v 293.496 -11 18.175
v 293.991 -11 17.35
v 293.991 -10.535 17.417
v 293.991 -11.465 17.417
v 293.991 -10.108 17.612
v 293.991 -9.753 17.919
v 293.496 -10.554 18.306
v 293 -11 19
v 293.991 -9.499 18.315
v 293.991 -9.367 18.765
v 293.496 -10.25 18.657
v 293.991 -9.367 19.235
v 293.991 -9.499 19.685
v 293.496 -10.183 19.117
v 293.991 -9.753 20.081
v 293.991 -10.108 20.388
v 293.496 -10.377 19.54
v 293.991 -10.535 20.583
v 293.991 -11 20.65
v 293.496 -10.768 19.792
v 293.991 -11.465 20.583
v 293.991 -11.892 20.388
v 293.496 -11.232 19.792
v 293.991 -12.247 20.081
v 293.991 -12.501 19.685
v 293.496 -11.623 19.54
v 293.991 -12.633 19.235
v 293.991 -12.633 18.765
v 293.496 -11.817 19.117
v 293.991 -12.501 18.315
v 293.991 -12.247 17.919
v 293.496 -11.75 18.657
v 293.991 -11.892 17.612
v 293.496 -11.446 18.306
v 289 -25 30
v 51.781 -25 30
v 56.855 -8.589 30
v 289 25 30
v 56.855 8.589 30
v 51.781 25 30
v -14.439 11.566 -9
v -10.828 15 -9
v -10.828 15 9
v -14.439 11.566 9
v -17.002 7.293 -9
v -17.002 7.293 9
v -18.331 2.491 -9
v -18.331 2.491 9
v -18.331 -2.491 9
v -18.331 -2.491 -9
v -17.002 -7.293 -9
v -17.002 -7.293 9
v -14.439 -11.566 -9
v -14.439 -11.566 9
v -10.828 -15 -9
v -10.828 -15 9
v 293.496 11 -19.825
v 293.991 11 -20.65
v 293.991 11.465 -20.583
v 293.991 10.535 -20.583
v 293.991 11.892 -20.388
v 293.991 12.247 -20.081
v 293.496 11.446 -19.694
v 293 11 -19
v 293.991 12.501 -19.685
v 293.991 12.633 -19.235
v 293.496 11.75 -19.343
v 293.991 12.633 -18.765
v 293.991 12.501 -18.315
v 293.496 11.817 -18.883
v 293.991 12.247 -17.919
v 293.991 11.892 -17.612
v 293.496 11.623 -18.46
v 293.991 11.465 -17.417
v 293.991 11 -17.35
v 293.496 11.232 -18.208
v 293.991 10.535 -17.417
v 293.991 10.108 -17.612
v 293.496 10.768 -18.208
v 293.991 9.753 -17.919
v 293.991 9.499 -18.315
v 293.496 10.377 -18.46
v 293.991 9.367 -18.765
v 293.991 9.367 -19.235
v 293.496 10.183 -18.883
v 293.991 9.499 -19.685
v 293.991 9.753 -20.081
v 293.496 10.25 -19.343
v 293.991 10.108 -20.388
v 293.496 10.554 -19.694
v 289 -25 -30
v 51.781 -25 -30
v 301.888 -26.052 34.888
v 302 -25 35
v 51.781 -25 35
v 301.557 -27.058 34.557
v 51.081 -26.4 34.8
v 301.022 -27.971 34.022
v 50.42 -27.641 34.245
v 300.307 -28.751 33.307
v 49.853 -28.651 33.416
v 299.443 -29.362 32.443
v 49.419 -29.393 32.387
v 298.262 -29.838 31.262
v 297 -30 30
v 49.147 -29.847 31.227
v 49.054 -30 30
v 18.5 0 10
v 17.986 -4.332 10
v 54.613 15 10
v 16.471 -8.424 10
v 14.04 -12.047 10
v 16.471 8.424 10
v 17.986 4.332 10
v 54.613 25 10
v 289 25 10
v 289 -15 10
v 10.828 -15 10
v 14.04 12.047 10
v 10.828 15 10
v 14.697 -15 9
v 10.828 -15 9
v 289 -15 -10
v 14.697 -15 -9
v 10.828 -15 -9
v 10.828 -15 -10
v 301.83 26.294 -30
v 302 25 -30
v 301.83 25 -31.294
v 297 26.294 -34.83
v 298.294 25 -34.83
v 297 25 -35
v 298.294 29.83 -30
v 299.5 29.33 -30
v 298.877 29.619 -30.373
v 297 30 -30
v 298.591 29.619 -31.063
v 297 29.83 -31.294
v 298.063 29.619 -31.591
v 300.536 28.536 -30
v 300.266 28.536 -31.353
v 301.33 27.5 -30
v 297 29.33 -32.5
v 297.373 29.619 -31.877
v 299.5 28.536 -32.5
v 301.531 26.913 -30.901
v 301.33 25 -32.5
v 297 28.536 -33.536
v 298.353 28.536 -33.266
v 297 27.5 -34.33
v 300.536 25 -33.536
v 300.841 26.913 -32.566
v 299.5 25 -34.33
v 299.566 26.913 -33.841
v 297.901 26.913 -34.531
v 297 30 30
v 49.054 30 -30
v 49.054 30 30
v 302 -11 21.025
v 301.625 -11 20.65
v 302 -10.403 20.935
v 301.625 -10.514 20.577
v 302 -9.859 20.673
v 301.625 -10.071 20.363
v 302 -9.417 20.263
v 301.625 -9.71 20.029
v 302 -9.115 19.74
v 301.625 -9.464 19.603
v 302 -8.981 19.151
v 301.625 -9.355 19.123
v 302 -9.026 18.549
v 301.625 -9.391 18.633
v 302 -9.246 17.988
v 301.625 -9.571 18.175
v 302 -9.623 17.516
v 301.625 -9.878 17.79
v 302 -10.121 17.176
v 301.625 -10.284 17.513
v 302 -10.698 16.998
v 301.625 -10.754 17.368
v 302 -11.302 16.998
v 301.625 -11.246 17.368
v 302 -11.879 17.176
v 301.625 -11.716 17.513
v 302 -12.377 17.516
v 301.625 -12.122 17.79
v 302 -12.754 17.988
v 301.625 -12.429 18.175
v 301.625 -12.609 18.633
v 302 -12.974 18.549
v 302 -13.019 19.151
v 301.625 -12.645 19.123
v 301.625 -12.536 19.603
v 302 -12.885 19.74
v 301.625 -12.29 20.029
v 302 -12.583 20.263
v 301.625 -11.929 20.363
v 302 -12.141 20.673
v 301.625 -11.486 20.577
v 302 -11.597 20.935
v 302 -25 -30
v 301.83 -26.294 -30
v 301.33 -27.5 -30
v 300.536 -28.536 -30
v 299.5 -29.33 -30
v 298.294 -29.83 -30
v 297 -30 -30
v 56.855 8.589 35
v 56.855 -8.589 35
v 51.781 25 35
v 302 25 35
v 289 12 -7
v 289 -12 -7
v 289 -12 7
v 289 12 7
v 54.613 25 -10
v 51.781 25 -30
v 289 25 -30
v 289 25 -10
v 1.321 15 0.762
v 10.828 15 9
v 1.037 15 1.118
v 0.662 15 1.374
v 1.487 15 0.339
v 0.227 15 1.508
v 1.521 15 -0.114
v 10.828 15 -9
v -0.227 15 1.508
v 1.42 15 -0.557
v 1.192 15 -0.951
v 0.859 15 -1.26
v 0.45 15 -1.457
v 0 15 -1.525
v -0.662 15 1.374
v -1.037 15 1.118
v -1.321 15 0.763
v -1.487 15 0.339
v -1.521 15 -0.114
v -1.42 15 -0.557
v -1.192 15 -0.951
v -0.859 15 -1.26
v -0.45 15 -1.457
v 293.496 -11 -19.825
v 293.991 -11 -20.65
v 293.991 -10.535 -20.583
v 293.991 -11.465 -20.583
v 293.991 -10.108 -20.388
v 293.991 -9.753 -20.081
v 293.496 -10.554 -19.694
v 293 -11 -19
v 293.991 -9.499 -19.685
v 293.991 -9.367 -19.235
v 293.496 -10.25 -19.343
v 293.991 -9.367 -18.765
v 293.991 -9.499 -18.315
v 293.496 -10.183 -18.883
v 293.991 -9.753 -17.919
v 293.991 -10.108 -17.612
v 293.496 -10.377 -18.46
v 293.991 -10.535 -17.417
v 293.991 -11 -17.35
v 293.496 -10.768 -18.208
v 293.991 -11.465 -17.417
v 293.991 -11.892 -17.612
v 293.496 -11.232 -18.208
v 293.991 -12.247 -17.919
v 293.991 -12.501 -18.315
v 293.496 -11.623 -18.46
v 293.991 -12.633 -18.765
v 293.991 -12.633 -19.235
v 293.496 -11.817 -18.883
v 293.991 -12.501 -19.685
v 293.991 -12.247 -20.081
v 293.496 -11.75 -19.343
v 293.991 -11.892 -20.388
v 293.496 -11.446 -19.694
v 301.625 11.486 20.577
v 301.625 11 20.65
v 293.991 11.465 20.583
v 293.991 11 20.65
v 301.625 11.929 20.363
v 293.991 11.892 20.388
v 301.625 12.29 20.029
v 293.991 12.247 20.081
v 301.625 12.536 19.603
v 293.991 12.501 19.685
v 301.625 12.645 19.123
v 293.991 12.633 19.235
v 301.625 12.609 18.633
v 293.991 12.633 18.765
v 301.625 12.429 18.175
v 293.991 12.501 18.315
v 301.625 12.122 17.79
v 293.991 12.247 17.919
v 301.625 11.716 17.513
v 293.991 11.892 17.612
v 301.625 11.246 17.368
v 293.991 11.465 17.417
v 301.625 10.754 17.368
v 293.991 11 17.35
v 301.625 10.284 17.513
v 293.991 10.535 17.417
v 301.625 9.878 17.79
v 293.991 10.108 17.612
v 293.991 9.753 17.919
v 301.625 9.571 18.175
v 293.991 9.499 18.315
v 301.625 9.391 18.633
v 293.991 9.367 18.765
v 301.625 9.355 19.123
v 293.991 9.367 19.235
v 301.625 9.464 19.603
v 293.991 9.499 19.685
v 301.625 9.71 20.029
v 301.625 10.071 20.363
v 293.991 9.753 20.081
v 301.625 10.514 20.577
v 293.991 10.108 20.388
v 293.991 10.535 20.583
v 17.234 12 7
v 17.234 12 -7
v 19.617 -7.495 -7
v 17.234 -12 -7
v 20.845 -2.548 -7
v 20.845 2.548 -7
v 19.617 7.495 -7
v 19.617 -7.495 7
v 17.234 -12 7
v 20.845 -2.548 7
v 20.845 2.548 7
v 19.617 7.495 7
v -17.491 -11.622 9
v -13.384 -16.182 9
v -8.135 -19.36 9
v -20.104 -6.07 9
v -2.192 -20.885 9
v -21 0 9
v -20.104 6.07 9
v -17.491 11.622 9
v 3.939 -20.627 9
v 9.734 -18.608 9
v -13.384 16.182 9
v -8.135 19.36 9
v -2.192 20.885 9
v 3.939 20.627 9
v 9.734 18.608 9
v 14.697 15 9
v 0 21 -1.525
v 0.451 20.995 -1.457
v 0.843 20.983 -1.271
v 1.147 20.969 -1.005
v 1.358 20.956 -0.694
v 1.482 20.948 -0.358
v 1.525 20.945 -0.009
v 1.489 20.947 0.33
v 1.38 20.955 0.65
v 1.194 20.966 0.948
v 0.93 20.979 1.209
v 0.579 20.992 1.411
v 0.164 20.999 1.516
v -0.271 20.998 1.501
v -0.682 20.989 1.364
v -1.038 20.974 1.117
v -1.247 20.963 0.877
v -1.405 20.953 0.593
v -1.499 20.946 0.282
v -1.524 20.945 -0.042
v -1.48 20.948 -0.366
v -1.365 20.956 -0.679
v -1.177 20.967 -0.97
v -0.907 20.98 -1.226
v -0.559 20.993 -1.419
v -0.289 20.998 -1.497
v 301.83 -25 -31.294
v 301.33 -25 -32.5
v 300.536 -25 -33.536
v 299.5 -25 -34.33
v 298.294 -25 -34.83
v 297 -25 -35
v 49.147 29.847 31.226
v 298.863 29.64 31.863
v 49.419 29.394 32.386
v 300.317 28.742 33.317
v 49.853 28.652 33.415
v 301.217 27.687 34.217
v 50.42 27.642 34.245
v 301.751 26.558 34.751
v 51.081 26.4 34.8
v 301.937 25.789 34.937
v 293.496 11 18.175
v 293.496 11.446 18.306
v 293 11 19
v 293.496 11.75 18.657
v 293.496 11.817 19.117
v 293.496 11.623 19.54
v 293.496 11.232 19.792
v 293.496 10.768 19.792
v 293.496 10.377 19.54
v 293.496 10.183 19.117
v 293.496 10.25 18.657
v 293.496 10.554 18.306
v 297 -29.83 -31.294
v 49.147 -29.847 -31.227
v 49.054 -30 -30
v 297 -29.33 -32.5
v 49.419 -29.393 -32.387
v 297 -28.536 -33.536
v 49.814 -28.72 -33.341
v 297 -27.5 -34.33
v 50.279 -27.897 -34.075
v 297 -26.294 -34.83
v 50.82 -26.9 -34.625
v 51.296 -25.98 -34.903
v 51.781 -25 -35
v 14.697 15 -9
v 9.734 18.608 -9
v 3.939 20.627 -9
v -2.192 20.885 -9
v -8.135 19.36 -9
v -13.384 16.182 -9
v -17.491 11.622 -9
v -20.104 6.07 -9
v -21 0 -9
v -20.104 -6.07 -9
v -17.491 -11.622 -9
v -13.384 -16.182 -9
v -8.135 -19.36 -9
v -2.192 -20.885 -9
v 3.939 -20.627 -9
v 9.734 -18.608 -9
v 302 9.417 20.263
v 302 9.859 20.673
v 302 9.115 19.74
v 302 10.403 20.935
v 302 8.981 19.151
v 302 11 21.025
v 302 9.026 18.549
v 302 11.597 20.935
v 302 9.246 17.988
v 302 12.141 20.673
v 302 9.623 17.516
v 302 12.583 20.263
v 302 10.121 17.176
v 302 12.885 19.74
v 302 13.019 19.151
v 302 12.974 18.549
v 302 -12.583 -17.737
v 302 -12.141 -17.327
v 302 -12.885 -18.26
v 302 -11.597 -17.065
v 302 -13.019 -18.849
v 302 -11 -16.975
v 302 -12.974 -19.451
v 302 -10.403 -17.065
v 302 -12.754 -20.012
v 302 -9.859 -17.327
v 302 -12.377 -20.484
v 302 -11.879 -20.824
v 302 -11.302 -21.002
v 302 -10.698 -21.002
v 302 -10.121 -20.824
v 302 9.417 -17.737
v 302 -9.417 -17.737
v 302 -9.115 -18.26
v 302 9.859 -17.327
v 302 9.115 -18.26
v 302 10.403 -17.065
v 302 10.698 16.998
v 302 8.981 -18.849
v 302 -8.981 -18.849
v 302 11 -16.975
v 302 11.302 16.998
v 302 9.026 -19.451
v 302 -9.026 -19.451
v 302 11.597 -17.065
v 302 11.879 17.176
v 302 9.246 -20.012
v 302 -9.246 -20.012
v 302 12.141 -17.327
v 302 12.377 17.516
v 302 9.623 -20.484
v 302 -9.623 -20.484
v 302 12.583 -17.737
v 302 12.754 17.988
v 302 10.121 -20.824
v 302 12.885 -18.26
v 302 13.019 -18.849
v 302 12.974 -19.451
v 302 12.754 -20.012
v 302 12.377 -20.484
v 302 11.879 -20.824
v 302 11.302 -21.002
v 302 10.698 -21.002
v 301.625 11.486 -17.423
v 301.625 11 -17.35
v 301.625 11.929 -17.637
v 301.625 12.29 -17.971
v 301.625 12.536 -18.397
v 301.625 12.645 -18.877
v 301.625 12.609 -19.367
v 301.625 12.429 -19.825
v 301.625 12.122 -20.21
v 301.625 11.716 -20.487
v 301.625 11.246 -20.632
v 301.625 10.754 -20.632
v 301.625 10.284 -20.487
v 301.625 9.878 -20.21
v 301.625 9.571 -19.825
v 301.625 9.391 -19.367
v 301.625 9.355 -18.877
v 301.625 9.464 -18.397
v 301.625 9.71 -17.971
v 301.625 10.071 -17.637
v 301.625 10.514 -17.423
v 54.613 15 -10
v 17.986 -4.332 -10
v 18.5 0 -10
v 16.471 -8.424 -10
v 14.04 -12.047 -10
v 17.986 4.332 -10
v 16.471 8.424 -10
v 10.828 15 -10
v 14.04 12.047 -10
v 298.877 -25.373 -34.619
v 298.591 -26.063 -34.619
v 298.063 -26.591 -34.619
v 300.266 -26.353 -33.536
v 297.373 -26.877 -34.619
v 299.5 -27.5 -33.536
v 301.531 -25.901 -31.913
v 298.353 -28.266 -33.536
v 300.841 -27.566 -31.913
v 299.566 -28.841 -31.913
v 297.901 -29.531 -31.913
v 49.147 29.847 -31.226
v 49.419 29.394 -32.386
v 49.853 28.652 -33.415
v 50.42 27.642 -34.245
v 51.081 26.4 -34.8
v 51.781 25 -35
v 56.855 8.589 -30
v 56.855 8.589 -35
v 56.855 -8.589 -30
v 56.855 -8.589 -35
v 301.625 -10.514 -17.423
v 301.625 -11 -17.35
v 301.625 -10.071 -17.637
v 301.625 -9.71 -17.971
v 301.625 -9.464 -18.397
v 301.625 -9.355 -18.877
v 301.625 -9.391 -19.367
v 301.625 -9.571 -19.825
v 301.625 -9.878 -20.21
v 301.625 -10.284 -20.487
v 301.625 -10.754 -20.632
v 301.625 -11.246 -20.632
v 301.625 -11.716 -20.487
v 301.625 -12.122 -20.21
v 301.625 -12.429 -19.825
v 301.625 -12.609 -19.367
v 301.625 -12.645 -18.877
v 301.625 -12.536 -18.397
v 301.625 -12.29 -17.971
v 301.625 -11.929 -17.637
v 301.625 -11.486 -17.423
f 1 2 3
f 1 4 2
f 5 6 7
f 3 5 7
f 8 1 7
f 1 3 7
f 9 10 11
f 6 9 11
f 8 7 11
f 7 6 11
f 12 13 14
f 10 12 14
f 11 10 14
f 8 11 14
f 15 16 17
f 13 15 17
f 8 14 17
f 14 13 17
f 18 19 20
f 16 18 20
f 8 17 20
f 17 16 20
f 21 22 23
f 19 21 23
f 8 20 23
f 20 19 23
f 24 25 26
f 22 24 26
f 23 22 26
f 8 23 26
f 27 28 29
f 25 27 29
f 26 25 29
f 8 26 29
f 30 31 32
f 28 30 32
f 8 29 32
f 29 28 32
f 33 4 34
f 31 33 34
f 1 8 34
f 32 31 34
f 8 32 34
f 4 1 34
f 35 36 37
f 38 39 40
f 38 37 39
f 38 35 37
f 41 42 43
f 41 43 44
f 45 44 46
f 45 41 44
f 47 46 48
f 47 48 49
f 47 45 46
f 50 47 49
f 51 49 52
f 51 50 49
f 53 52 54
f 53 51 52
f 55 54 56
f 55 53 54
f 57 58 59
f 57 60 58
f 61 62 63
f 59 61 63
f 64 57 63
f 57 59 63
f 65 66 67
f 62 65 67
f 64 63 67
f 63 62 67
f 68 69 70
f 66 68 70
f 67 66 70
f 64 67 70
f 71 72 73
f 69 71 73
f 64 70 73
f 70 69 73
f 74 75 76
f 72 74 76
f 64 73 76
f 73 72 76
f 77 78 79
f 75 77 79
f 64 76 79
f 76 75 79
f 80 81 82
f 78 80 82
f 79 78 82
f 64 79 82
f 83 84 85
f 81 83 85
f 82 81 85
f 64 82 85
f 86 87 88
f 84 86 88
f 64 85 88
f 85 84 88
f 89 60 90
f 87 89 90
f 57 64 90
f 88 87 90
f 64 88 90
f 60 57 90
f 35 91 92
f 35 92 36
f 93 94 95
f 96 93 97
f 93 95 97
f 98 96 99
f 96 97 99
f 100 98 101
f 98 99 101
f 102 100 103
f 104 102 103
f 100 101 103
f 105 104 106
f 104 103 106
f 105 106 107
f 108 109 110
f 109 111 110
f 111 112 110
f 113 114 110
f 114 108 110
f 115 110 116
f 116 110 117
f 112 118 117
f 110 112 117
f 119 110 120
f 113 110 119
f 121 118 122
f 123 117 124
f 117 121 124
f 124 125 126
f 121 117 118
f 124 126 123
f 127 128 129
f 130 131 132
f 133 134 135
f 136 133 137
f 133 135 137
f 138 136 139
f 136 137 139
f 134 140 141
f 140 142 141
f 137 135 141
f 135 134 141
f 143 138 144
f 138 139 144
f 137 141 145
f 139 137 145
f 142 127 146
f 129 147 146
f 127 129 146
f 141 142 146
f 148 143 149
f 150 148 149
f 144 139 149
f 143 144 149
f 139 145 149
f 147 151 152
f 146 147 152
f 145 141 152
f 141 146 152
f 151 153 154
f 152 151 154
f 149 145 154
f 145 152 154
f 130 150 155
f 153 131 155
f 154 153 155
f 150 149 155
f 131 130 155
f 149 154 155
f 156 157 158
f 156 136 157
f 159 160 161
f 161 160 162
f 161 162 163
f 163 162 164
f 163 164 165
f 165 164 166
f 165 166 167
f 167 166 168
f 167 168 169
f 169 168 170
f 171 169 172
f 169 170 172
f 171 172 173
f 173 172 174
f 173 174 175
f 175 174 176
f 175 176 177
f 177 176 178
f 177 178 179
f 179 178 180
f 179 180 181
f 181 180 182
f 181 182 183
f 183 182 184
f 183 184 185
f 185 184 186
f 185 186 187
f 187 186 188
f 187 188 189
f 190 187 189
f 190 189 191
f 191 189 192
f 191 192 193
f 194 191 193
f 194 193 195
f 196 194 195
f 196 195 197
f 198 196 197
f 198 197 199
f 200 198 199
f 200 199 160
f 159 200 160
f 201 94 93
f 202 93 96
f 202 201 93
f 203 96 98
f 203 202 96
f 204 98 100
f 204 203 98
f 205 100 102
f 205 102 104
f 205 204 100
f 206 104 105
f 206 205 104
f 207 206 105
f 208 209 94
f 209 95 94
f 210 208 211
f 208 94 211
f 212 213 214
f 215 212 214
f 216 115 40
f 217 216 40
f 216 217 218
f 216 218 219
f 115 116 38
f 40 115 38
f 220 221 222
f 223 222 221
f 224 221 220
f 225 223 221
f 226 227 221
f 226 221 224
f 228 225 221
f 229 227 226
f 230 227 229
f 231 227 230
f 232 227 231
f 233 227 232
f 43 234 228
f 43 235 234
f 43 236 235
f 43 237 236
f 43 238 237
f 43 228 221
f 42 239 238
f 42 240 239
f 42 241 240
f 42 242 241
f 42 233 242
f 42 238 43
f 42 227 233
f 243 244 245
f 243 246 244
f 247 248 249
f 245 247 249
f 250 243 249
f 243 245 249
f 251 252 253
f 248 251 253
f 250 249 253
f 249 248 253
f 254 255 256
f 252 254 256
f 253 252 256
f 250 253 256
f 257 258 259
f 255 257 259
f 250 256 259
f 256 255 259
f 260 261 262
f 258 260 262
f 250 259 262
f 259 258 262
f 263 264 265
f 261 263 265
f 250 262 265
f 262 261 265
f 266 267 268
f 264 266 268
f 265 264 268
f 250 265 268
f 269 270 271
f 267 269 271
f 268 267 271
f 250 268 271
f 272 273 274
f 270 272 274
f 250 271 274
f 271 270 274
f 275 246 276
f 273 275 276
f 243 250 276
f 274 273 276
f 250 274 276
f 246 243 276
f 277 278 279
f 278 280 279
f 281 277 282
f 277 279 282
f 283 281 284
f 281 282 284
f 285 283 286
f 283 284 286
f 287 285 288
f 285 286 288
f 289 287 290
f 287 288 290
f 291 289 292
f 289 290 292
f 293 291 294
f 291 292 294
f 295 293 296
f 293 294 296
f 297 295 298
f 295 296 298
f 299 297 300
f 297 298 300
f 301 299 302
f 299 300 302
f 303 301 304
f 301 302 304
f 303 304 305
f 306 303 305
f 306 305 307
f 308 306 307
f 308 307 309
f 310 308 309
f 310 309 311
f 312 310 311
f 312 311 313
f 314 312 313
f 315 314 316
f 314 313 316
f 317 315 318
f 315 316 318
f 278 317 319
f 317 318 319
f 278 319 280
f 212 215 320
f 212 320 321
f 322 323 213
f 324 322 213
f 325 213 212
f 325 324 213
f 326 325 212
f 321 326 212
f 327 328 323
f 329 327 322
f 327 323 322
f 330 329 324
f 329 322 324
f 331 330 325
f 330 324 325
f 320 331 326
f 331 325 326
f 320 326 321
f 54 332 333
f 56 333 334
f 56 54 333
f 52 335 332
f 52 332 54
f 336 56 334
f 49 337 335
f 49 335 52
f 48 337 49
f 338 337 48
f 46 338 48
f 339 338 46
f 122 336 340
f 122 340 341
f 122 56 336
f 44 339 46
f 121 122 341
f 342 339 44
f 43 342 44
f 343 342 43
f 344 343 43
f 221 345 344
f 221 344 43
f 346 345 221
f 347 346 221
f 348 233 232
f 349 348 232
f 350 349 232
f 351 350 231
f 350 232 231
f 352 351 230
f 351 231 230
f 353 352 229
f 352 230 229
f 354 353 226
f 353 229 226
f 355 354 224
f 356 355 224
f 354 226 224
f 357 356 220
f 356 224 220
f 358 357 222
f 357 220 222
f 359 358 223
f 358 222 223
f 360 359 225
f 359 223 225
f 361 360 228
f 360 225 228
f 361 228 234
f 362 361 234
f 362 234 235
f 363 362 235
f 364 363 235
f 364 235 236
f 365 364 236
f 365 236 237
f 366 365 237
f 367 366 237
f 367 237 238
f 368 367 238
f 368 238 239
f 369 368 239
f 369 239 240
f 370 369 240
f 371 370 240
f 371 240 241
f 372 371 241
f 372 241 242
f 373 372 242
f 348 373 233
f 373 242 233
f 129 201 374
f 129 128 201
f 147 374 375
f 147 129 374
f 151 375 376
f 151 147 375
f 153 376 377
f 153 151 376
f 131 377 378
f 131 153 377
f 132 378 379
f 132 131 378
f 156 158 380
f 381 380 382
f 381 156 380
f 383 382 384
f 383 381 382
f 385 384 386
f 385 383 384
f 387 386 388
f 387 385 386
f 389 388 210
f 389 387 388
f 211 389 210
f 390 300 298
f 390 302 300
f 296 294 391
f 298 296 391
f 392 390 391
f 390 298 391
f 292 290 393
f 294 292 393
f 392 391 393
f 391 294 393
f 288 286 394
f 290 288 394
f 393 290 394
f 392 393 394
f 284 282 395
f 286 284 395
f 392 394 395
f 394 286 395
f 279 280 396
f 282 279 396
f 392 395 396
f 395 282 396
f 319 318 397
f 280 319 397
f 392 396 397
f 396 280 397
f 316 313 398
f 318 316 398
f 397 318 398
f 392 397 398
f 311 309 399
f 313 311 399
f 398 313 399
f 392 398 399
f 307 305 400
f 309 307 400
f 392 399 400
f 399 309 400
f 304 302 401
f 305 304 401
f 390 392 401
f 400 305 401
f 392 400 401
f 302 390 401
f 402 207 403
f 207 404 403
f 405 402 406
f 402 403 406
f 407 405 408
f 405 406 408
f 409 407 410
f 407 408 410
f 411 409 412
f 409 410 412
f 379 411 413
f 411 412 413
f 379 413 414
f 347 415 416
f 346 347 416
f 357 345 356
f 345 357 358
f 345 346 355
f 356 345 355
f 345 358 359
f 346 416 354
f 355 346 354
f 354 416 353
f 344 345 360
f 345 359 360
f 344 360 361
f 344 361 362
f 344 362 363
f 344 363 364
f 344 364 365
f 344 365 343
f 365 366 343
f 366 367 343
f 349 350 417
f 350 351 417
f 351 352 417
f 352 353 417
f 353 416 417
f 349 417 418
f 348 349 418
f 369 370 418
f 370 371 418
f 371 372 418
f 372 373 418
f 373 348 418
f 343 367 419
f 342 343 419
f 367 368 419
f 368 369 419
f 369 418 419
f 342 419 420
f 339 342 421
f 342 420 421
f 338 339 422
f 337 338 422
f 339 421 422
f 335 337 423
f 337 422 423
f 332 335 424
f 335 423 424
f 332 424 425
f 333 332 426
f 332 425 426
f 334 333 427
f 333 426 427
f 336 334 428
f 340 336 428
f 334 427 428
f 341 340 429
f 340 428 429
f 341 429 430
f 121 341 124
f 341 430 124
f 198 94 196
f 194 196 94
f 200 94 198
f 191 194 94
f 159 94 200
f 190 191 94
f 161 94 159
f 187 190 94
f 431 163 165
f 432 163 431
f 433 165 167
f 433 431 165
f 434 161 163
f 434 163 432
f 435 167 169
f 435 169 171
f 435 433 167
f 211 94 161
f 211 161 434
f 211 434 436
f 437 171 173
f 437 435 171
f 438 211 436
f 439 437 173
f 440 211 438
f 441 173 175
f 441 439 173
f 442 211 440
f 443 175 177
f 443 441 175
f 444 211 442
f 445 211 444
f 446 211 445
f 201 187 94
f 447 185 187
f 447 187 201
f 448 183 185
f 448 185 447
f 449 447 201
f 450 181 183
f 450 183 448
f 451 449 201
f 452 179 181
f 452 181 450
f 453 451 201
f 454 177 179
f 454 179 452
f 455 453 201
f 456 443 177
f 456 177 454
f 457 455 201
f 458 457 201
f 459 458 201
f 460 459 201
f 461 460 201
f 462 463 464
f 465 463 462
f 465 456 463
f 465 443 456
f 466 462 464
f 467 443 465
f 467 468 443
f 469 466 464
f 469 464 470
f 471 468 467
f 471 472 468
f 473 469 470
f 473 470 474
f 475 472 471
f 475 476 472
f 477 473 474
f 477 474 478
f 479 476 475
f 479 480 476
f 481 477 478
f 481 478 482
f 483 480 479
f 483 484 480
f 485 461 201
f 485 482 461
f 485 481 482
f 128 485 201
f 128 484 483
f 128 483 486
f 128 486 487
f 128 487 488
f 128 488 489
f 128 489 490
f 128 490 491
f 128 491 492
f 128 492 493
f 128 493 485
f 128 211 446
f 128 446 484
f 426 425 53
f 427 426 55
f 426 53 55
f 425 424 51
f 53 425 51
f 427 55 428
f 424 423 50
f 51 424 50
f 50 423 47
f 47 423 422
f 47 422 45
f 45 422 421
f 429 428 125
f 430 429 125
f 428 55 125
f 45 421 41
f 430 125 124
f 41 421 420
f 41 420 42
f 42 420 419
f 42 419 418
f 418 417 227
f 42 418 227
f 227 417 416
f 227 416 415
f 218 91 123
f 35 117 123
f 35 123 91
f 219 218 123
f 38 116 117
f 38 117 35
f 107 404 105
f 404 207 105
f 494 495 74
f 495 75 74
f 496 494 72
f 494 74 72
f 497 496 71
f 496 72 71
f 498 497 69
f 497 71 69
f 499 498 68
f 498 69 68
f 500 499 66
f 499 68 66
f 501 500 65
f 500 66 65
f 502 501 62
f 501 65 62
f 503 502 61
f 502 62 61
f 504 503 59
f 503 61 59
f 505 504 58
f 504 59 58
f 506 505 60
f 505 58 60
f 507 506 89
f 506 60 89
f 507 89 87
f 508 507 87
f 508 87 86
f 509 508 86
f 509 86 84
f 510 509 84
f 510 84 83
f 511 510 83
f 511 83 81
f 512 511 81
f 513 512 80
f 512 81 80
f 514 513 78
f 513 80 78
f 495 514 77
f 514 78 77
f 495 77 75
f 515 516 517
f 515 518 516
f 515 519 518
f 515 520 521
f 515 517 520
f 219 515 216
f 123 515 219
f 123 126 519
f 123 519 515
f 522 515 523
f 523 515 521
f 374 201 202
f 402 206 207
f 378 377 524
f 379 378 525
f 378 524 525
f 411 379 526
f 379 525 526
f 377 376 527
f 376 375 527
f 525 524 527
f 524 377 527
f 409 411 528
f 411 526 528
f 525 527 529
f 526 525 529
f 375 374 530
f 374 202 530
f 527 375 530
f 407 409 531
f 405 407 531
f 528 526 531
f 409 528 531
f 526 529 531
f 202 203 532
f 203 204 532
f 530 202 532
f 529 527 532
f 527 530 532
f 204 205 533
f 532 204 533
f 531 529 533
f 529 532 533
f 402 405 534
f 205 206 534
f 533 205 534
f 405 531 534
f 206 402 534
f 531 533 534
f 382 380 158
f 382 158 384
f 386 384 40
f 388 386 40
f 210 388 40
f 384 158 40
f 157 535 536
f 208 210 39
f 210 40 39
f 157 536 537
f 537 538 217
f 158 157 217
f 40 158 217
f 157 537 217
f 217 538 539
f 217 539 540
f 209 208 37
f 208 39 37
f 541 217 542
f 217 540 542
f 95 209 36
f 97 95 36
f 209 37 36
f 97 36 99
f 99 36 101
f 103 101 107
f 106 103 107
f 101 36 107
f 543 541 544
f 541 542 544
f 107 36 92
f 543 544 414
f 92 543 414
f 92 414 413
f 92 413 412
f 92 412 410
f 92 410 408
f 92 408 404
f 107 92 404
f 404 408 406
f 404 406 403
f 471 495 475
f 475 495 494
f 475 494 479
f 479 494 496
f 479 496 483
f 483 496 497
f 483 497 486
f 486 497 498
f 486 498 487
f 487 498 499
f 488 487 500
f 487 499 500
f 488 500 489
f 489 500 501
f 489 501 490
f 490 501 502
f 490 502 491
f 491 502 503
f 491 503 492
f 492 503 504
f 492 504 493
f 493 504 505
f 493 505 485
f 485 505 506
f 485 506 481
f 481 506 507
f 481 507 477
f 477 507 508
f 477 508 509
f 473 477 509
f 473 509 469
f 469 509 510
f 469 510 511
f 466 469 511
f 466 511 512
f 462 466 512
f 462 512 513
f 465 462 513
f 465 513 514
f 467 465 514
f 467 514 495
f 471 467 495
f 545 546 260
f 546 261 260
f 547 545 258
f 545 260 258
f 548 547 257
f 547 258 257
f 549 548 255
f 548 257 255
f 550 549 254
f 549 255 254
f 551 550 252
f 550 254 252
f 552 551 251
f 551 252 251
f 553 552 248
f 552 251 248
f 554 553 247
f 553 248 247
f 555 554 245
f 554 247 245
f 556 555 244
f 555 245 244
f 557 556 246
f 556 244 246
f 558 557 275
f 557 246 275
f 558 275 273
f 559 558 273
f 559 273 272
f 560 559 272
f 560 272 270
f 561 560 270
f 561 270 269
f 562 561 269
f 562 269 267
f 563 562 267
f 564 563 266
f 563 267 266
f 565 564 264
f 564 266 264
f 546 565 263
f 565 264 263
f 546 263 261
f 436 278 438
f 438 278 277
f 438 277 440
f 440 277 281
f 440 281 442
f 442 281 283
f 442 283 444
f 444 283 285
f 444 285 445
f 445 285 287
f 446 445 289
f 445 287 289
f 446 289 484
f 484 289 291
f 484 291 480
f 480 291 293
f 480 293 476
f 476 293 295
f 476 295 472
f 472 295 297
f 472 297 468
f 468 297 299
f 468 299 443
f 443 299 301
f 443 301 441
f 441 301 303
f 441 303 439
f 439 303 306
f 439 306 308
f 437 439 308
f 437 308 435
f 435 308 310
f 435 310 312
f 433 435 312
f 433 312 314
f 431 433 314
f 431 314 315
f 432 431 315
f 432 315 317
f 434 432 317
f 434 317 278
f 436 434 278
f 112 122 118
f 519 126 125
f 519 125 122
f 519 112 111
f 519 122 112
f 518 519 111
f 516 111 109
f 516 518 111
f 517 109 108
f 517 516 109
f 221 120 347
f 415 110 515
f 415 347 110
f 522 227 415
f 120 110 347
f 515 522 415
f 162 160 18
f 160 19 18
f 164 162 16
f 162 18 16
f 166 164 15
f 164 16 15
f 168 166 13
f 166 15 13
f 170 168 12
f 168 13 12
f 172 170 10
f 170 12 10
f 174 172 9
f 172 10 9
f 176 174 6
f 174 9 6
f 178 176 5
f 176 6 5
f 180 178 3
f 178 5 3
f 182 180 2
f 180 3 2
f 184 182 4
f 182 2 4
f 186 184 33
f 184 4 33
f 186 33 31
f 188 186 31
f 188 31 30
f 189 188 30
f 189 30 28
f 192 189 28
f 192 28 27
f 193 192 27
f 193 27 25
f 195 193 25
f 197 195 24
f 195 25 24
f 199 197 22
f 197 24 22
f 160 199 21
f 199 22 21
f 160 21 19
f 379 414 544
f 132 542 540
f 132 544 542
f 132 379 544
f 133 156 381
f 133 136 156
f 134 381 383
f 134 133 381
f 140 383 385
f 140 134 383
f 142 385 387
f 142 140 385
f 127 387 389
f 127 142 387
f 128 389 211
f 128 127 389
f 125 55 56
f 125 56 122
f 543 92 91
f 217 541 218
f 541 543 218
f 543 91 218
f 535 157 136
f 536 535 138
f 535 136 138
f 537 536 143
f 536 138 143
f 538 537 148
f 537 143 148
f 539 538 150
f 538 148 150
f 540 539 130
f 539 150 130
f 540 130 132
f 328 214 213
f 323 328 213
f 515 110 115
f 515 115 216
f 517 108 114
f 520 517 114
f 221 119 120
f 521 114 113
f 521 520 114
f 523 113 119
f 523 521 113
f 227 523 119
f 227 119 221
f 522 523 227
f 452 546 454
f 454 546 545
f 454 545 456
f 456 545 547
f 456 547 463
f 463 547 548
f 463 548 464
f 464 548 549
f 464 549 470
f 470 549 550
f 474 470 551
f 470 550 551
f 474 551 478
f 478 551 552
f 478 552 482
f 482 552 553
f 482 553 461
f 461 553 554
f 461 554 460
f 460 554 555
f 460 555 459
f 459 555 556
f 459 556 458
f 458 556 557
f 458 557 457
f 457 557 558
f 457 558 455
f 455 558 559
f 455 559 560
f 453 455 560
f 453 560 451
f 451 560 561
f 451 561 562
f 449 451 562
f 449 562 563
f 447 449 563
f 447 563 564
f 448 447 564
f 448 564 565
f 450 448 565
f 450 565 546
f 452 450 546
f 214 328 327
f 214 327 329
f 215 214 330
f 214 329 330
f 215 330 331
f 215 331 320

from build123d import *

# Parameters (mm, degrees)
SKETCH2_W                   = 20
SKETCH2_H                   = 30
SKETCH2_W_2                 = 14
SKETCH2_H_2                 = 24
BOSS_EXTRUDE1_DEPTH         = 302
SKETCH9_W                   = 70
SKETCH9_H                   = 60
BOSS_EXTRUDE2_DEPTH         = 3
BOSS_EXTRUDE3_DEPTH         = 9
BOSS_EXTRUDE3_DEPTH_BACK    = 9
SKETCH10_R                  = 21
SKETCH10_R_2                = 18.5
CUT_EXTRUDE1_DEPTH          = 19
CUT_EXTRUDE1_DEPTH_BACK     = 19
SKETCH14_W                  = 70
SKETCH14_H                  = 60
BOSS_EXTRUDE5_DEPTH         = 10
BOSS_EXTRUDE6_REACH         = 315.409
BOSS_EXTRUDE6_END_RADIUS    = 57.5
SKETCH15_W                  = 70
SKETCH15_H                  = 60
SKETCH15_W_2                = 60
SKETCH15_H_2                = 50
SKETCH16_W                  = 247.387457627
SKETCH16_H                  = 20
BOSS_EXTRUDE7_DEPTH         = 10
FILLET1_R                   = 5
M4_TAPPED_HOLE1_D           = 3.3
M4_TAPPED_HOLE1_DEPTH       = 8.008579979
M4_TAPPED_HOLE1_CSINK_D     = 4.05
M4_TAPPED_HOLE1_CSINK_ANGLE = 90
M4_TAPPED_HOLE1_TIP         = 0.991420021
SKETCH19_R                  = 1.525
CUT_EXTRUDE3_DEPTH          = 10


with BuildPart() as part:
    # Sketch2 → Boss-Extrude1 (new body)
    with BuildSketch(Plane(origin=(0, 0, 0), x_dir=(0, 0, -1), z_dir=(1, 0, 0))):
        Rectangle(SKETCH2_W, SKETCH2_H)
        Rectangle(SKETCH2_W_2, SKETCH2_H_2, mode=Mode.SUBTRACT)
    extrude(amount=BOSS_EXTRUDE1_DEPTH)

    # Sketch9 → Boss-Extrude2 (add)
    with BuildSketch(Plane(origin=(302, 0, 0), x_dir=(0, 0, -1), z_dir=(1, 0, 0))):
        Rectangle(SKETCH9_W, SKETCH9_H)
    extrude(amount=-BOSS_EXTRUDE2_DEPTH)

    # Sketch10 → Boss-Extrude3 (add, two sides: drawn at the far end of the back side and taken through both)
    # profile 1 of 3: a face of its own
    with BuildSketch(Plane.XY.offset(-BOSS_EXTRUDE3_DEPTH_BACK)):
        Circle(SKETCH10_R)
        Circle(SKETCH10_R_2, mode=Mode.SUBTRACT)
    # profile 2 of 3: a face of its own
    with BuildSketch(Plane.XY.offset(-BOSS_EXTRUDE3_DEPTH_BACK)):
        with BuildLine():
            ThreePointArc((10.828203914, 15), (0, 18.5), (-10.828203914, 15))
            Line((-10.828203914, 15), (10.828203914, 15))
        make_face()
    # profile 3 of 3: a face of its own
    with BuildSketch(Plane.XY.offset(-BOSS_EXTRUDE3_DEPTH_BACK)):
        with BuildLine():
            ThreePointArc((-10.828203914, -15), (0, -18.5), (10.828203914, -15))
            Line((10.828203914, -15), (-10.828203914, -15))
        make_face()
    extrude(amount=BOSS_EXTRUDE3_DEPTH + BOSS_EXTRUDE3_DEPTH_BACK)

    # Sketch10<3> → Cut-Extrude1 (cut, two sides: drawn at the far end of the back side and taken through both)
    with BuildSketch(Plane.XY.offset(-CUT_EXTRUDE1_DEPTH_BACK)):
        with BuildLine():
            Line((-10.828203914, -15), (10.828203914, -15))
            ThreePointArc((10.828203914, -15), (16.470758519, -8.42402005), (18.5, 0))
            ThreePointArc((18.5, 0), (16.470758519, 8.42402005), (10.828203914, 15))
            Line((10.828203914, 15), (-10.828203914, 15))
            ThreePointArc((-10.828203914, 15), (-18.5, 0), (-10.828203914, -15))
        make_face()
    extrude(amount=CUT_EXTRUDE1_DEPTH + CUT_EXTRUDE1_DEPTH_BACK, mode=Mode.SUBTRACT)

    # Sketch14 → Boss-Extrude5 (add)
    with BuildSketch(Plane.ZY.offset(-299)):
        Rectangle(SKETCH14_W, SKETCH14_H)
    extrude(amount=BOSS_EXTRUDE5_DEPTH)

    # Boss-Extrude6: up to this cylinder (the profile starts outside it)
    boss_extrude6_end = Plane(origin=(0, 0, 0), z_dir=(0, 0, -1)) * Cylinder(BOSS_EXTRUDE6_END_RADIUS, 746.818, mode=Mode.PRIVATE)
    # Sketch15 → Boss-Extrude6 (add, up to the surface)
    with BuildSketch(Plane.ZY.offset(-289), mode=Mode.PRIVATE) as boss_extrude6_sk1:
        Rectangle(SKETCH15_W, SKETCH15_H)
        Rectangle(SKETCH15_W_2, SKETCH15_H_2, mode=Mode.SUBTRACT)
    boss_extrude6_tool1 = extrude(boss_extrude6_sk1.sketch, amount=BOSS_EXTRUDE6_REACH, mode=Mode.PRIVATE) - boss_extrude6_end
    add(boss_extrude6_tool1.solids().sort_by_distance((289, -29.078046, 0))[0])

    # Sketch16 → Boss-Extrude7 (add)
    with BuildSketch(Plane(origin=(0, 15, 0), x_dir=(1, 0, 0), z_dir=(0, 1, 0))):
        with Locations((178.306271186, 0)):
            Rectangle(SKETCH16_W, SKETCH16_H)
    extrude(amount=BOSS_EXTRUDE7_DEPTH)

    # Fillet1
    fillet1_edges = [part.edges().sort_by_distance(p)[0] for p in [
        (302, -30, 0),
        (302, 0, -35),
        (175.526771088, -30, 35),
        (302, 30, 0),
        (175.526771088, 30, 35),
        (175.526771088, 30, -35),
        (175.526771088, -30, -35),
    ]]
    fillet(fillet1_edges, radius=FILLET1_R)

    # M4 Tapped Hole1
    with Locations(Plane(origin=(302, 0, 0), x_dir=(0, 0, -1), z_dir=(1, 0, 0))):
        with Locations((-19, 11), (19, 11), (-19, -11), (19, -11)):
            CounterSinkHole(M4_TAPPED_HOLE1_D / 2, M4_TAPPED_HOLE1_CSINK_D / 2, depth=M4_TAPPED_HOLE1_DEPTH, counter_sink_angle=M4_TAPPED_HOLE1_CSINK_ANGLE)
            with Locations((0, 0, -(M4_TAPPED_HOLE1_DEPTH + M4_TAPPED_HOLE1_TIP / 2))):  # 118° drill point
                Cone(0, M4_TAPPED_HOLE1_D / 2, M4_TAPPED_HOLE1_TIP, mode=Mode.SUBTRACT)

    # Sketch19 → Cut-Extrude3 (cut)
    with BuildSketch(Plane.XZ.offset(-15)):
        with Locations(Location((0, 0, 0), (0, 0, 270))):
            Circle(SKETCH19_R)
    extrude(amount=-CUT_EXTRUDE3_DEPTH, mode=Mode.SUBTRACT)


solid = part.part
